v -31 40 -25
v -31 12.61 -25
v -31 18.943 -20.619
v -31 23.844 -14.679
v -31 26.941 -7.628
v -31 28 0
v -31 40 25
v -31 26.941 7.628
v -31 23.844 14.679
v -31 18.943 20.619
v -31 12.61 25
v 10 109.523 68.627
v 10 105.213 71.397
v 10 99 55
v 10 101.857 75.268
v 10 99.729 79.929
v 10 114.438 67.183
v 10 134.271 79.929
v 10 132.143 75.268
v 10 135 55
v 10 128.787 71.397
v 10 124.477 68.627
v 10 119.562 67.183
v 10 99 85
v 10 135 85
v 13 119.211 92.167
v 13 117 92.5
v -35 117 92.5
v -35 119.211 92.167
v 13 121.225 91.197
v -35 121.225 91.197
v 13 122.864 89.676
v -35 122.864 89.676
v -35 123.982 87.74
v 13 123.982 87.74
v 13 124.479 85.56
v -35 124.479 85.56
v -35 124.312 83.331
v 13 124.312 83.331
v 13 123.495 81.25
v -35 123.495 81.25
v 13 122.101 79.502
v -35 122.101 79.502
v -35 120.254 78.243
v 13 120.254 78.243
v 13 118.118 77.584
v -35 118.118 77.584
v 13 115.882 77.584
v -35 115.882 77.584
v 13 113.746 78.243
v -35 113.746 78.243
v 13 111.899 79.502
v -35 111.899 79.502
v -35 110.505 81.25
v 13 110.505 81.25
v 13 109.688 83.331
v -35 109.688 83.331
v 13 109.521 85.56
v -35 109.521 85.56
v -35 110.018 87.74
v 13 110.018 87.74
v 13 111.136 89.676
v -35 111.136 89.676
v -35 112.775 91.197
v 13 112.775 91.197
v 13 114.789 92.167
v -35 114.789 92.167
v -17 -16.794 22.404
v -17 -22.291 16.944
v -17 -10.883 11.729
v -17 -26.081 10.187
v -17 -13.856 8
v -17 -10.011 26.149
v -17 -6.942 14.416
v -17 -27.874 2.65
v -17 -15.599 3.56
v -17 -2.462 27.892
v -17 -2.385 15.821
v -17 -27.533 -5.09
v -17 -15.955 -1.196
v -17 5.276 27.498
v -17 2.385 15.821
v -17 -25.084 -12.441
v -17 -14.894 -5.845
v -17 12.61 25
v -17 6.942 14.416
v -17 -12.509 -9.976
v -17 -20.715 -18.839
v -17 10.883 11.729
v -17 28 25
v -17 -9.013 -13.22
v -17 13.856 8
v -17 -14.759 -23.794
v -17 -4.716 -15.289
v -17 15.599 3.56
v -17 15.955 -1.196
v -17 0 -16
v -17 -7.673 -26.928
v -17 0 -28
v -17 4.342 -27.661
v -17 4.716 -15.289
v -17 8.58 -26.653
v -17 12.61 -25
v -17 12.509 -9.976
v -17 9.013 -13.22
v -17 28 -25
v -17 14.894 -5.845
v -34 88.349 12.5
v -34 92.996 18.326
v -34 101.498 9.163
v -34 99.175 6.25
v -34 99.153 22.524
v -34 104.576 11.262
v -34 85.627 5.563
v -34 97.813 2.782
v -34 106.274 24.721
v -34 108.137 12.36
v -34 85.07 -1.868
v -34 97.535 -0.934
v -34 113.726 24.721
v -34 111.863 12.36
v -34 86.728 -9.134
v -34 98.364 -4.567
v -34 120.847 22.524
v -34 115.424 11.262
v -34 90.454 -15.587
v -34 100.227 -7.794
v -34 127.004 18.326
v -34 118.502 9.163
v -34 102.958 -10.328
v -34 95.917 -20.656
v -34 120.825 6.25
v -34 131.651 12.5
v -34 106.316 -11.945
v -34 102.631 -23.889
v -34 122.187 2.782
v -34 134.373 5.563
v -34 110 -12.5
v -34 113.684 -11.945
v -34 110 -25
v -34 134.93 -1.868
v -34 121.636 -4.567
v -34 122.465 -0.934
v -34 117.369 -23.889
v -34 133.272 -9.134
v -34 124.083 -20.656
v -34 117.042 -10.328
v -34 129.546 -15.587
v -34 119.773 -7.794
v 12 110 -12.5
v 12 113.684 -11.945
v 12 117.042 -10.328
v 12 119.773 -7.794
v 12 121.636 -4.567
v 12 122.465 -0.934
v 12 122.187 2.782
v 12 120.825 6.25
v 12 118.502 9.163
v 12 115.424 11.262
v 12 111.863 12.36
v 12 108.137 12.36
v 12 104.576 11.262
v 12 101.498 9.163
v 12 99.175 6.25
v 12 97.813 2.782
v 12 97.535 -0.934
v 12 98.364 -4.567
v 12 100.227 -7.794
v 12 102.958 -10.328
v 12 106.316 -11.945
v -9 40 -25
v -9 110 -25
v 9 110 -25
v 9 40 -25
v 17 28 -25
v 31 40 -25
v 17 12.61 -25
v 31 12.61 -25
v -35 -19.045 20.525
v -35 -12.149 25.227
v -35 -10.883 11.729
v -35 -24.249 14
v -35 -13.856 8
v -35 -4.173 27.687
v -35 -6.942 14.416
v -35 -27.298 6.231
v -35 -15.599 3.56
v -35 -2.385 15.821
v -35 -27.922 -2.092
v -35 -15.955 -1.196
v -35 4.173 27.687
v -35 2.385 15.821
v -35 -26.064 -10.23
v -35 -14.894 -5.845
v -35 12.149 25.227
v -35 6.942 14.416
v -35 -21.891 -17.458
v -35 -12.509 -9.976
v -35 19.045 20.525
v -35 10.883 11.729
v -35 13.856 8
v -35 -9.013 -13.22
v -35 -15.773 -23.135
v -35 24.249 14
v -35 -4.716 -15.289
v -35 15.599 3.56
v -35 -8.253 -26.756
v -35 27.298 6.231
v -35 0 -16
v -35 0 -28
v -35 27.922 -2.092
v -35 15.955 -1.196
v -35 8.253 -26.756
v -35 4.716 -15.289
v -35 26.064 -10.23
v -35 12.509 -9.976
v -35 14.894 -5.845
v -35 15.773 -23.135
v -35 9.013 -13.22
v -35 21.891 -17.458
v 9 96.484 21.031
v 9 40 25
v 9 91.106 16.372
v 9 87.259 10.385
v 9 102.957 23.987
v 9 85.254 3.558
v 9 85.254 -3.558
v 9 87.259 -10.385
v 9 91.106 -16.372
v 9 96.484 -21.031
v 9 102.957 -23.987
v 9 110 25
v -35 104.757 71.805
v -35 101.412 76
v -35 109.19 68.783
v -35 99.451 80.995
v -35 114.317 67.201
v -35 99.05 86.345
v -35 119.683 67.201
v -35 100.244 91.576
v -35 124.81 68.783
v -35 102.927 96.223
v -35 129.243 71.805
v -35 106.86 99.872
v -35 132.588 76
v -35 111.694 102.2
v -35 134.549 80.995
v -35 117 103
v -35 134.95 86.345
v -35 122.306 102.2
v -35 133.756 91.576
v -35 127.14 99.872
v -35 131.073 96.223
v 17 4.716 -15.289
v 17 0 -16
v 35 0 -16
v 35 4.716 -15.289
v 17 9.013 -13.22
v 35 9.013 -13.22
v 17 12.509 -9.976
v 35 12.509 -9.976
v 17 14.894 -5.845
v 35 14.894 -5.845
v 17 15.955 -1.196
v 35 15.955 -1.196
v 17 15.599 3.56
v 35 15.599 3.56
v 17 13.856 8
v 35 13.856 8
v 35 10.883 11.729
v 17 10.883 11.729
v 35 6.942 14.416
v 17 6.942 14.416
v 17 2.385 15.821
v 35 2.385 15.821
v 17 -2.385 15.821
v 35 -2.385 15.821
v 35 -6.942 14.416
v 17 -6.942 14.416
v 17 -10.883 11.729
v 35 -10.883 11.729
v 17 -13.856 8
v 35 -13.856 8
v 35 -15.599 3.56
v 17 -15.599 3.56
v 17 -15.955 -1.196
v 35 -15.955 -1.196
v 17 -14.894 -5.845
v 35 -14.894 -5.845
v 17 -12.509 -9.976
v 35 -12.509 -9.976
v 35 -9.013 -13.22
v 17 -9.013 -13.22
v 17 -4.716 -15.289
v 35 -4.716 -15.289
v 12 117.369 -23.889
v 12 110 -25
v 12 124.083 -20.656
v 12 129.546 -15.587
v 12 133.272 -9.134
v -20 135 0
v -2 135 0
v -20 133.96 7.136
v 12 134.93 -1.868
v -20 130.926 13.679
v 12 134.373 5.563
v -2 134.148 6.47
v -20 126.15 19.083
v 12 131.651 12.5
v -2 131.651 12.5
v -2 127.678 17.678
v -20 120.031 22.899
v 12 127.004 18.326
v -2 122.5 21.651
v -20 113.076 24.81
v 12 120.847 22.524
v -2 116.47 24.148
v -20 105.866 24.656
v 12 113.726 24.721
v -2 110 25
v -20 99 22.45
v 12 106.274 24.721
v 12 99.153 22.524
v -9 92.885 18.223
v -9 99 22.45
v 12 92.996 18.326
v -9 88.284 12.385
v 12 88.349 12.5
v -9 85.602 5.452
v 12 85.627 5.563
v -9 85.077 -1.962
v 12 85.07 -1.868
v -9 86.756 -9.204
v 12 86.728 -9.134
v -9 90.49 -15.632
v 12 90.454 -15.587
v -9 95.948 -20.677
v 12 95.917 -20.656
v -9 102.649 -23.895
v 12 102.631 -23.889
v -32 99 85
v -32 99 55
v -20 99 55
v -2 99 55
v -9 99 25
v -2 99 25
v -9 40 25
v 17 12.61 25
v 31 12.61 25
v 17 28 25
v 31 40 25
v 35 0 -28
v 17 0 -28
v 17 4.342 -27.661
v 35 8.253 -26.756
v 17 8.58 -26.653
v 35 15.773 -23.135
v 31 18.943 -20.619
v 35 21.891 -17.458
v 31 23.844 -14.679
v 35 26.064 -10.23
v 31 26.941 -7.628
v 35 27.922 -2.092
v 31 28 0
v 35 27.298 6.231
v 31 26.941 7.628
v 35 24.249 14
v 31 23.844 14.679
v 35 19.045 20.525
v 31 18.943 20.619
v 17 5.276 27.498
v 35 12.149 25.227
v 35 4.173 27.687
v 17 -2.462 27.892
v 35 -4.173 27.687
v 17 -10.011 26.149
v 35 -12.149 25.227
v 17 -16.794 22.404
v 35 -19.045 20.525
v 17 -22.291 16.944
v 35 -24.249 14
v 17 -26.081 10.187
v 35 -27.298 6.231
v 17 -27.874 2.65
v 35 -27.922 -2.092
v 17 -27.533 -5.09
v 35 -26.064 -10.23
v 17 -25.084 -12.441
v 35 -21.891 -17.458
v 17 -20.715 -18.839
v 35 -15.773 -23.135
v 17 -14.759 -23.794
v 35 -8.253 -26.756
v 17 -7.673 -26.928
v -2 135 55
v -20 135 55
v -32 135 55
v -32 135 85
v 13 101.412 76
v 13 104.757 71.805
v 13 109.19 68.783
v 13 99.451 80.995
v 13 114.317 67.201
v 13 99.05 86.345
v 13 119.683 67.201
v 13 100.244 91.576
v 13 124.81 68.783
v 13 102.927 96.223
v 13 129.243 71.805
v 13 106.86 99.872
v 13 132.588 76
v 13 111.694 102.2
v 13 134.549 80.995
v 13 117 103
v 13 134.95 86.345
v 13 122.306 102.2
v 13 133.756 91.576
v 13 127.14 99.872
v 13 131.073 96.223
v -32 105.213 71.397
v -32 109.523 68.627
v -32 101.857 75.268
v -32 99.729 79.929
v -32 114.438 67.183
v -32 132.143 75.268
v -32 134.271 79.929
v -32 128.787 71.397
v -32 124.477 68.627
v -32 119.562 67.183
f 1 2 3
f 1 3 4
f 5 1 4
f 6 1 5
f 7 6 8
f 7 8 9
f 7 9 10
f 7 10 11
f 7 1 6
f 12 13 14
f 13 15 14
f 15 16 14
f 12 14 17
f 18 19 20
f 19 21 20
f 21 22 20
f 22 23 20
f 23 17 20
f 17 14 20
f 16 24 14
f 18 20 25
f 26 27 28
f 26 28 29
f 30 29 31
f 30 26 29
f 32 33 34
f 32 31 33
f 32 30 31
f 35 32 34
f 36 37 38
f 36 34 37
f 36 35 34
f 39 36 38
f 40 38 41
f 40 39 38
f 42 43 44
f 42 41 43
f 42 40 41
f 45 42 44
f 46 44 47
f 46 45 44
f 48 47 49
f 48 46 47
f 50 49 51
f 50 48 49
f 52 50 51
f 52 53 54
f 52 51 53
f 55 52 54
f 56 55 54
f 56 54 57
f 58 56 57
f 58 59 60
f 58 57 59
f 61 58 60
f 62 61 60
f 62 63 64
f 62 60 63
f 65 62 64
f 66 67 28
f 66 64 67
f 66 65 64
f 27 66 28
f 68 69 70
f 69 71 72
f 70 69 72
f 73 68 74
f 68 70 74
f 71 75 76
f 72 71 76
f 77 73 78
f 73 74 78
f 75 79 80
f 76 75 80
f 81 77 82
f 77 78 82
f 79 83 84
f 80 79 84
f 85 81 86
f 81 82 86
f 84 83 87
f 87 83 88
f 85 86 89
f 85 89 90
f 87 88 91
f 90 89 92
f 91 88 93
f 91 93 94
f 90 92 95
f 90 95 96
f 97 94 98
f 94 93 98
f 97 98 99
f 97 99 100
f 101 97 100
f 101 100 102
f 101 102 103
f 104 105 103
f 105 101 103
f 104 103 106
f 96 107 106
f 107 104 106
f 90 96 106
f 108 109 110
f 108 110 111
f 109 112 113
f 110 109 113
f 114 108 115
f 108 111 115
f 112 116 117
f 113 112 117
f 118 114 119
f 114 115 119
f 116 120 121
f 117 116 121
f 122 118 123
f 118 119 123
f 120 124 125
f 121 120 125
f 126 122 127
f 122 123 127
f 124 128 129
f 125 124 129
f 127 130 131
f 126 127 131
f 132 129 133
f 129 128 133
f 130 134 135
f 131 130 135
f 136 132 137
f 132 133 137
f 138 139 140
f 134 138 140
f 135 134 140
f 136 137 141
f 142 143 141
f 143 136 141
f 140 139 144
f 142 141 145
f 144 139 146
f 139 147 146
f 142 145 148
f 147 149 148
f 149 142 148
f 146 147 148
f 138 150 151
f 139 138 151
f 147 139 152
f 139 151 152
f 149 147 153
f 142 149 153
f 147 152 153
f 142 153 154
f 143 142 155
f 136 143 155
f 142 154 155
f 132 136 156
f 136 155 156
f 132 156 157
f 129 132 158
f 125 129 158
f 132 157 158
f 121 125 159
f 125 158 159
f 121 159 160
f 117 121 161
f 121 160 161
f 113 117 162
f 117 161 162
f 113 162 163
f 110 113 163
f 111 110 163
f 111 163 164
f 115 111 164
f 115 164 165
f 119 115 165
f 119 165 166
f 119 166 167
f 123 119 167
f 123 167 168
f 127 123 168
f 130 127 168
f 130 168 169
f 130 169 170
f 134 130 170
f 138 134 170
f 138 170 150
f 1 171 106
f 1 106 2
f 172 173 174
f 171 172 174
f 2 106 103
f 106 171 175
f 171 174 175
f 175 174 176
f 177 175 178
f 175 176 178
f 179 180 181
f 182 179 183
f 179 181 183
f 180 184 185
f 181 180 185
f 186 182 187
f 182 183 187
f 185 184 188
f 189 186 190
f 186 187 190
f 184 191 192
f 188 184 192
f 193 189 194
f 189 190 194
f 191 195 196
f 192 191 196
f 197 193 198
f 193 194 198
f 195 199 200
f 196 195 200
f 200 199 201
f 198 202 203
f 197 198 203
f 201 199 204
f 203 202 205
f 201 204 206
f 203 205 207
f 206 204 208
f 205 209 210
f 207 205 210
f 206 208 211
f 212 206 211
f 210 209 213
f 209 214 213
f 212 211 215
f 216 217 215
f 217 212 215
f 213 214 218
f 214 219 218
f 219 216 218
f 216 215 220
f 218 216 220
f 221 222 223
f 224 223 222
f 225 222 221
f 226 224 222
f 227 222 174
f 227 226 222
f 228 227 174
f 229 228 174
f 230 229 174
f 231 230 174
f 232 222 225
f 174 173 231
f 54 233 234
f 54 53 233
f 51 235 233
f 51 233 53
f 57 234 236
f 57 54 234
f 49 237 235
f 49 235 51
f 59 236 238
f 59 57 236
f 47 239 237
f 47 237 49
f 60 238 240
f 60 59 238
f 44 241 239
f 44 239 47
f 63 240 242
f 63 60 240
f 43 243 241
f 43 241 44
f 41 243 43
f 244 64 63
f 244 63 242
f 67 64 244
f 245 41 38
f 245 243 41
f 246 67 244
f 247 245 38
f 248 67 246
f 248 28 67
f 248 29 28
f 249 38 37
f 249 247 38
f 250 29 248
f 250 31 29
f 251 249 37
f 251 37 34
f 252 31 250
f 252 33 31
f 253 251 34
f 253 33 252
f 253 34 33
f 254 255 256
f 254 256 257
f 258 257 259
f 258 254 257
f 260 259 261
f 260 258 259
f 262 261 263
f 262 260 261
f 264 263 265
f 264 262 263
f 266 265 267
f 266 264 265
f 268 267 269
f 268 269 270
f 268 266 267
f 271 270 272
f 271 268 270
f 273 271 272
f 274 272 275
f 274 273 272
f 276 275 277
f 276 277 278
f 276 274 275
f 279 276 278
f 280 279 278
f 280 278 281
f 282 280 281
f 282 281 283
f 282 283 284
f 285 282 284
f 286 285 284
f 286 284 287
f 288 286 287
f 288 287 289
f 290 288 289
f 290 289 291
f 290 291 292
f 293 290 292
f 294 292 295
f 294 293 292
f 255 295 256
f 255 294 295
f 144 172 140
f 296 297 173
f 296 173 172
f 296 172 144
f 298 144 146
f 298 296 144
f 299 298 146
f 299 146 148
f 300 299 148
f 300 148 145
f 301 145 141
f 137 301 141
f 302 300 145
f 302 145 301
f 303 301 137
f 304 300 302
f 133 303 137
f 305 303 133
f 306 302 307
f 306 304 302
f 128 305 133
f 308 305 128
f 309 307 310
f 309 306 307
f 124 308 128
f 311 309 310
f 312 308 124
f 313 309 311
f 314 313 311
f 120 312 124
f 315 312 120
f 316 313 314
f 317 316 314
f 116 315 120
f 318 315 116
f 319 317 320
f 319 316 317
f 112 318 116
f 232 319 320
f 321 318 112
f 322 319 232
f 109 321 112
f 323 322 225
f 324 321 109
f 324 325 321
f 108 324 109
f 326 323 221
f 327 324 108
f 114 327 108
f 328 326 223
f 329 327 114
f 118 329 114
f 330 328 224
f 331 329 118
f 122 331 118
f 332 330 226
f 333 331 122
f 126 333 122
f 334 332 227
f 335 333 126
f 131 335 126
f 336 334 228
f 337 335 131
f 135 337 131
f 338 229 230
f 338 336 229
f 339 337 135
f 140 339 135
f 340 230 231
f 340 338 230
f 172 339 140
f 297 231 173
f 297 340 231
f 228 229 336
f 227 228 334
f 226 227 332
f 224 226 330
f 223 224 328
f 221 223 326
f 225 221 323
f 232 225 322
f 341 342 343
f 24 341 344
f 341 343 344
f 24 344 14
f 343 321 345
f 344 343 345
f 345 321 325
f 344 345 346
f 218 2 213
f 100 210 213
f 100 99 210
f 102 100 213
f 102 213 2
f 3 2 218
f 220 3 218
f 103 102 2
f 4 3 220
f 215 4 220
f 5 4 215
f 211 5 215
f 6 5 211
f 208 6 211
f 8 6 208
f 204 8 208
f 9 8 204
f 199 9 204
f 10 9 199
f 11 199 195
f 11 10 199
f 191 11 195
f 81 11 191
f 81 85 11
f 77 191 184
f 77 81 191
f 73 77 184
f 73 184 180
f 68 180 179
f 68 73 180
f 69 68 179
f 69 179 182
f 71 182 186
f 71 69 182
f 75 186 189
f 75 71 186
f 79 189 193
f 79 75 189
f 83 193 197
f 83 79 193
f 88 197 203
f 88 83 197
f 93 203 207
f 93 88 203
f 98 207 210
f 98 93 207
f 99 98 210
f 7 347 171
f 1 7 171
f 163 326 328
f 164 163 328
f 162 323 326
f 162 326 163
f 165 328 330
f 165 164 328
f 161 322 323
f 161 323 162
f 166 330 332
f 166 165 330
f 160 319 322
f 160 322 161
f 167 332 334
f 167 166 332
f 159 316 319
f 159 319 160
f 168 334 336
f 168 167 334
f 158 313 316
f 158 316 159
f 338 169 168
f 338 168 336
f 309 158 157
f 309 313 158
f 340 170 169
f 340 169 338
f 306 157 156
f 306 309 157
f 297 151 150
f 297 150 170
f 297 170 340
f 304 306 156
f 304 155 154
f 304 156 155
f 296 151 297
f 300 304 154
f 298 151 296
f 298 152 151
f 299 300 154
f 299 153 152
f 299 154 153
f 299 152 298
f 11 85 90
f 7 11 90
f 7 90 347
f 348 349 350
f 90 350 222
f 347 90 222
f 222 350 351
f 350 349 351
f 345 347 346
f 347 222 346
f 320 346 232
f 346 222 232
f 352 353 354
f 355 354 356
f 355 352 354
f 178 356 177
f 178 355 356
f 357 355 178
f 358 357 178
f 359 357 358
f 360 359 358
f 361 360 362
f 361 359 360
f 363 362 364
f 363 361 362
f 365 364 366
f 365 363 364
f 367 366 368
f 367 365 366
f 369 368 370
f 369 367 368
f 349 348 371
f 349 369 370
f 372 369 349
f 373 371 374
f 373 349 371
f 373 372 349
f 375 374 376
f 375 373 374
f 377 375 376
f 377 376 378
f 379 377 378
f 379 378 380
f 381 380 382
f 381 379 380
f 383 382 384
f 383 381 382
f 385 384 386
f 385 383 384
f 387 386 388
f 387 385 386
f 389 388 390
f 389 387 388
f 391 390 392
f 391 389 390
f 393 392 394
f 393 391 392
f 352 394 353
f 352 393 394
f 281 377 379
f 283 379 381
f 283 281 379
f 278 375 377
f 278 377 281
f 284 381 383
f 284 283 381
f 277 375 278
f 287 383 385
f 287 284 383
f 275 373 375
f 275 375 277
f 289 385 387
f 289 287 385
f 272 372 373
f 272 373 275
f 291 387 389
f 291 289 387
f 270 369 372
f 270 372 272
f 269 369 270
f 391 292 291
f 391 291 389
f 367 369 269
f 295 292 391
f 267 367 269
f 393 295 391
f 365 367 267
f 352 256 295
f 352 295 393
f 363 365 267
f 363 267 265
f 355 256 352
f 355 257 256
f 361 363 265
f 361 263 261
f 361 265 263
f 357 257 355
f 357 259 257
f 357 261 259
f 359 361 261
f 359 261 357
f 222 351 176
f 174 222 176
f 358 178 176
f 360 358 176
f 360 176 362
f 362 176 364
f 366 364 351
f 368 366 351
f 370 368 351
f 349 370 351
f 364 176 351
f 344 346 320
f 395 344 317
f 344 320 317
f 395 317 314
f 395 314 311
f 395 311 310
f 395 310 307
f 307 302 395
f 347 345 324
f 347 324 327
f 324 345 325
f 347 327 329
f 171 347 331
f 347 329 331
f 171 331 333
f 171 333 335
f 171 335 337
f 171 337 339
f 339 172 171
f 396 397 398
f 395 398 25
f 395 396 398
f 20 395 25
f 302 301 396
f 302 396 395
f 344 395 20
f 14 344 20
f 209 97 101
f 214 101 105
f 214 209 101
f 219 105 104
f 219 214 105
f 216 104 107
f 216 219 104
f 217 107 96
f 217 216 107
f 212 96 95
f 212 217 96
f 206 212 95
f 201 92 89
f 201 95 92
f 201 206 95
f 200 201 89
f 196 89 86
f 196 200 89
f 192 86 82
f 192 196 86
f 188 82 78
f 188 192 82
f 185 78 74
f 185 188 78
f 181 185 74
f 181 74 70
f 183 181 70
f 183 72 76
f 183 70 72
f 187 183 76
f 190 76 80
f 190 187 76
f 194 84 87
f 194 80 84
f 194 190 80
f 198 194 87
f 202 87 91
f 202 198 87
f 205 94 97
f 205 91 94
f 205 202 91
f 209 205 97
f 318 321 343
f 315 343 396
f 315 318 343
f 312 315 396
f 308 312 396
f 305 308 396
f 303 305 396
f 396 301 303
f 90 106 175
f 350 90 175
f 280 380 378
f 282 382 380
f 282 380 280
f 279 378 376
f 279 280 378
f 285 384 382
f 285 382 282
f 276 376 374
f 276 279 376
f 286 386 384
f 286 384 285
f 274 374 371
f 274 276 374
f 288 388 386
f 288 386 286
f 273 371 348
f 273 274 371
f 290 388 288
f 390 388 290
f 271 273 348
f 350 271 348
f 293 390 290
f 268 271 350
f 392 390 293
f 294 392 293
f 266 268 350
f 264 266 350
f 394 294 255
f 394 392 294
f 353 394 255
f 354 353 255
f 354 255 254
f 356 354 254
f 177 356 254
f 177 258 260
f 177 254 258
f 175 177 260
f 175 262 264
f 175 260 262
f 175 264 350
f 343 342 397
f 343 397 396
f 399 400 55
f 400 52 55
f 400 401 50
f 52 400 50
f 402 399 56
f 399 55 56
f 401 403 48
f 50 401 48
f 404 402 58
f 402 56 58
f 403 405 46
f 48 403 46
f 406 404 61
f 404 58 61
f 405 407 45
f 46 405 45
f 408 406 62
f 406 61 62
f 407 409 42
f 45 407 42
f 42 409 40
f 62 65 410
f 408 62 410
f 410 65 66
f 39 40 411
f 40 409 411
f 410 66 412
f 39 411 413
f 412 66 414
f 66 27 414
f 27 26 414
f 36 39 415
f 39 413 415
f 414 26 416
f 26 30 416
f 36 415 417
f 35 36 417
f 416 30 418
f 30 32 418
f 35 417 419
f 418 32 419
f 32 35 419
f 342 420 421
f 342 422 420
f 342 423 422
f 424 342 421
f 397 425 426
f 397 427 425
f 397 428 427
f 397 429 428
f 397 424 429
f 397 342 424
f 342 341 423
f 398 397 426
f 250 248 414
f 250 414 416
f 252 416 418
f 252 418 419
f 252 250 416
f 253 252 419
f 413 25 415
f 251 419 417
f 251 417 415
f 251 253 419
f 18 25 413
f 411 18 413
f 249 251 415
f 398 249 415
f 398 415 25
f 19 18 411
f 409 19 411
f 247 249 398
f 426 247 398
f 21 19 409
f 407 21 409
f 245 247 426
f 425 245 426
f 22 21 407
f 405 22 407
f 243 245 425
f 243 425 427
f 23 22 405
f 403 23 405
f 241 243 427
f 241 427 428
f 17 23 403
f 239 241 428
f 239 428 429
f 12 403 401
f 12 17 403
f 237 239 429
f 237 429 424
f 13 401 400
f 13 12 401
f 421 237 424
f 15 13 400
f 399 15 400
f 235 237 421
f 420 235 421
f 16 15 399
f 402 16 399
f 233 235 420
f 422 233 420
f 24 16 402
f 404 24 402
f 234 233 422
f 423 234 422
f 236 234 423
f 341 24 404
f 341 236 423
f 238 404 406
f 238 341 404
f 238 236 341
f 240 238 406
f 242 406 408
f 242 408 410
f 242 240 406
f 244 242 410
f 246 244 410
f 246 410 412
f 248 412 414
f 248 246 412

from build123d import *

# Parameters (mm, degrees)
SKETCH1_R               = 28
SKETCH1_R_2             = 16
BOSS_EXTRUDE1_DEPTH     = 35
BOSS_EXTRUDE4_DEPTH     = 31
BOSS_EXTRUDE8_DEPTH     = 9
BOSS_EXTRUDE10_START    = 12
SKETCH6_8_R             = 12.5
BOSS_EXTRUDE10_DEPTH    = 12
SKETCH6_9_R             = 12.5
BOSS_EXTRUDE11_DEPTH    = 34
CUT_EXTRUDE2_DEPTH      = 143.246265329
CUT_EXTRUDE2_DEPTH_BACK = 143.246265329
SKETCH8_W               = 34
SKETCH8_H               = 56
SKETCH9_W               = 18
SKETCH9_H               = 36
BOSS_EXTRUDE12_DEPTH    = 55
CUT_EXTRUDE3_DEPTH      = 150.916643506
CUT_EXTRUDE3_DEPTH_BACK = 150.916643506
SKETCH12_R              = 12.5
SKETCH18_W              = 42
SKETCH18_H              = 36
BOSS_EXTRUDE15_DEPTH    = 30
CUT_EXTRUDE8_DEPTH      = 167.03011775
CUT_EXTRUDE8_DEPTH_BACK = 167.03011775
SKETCH30_R              = 7.5
SKETCH31_R              = 18
BOSS_EXTRUDE18_DEPTH    = 24
CUT_EXTRUDE9_DEPTH      = 176.926120858
CUT_EXTRUDE9_DEPTH_BACK = 176.926120858
SKETCH30_2_R            = 7.5


with BuildPart() as part:
    # Sketch1 → Boss-Extrude1 (new, symmetric)
    with BuildSketch(Plane(origin=(0, 0, 0), x_dir=(0, 0, -1), z_dir=(1, 0, 0))):
        Circle(SKETCH1_R)
        Circle(SKETCH1_R_2, mode=Mode.SUBTRACT)
    extrude(amount=BOSS_EXTRUDE1_DEPTH, both=True)

    # Sketch2 → Boss-Extrude4 (add, symmetric)
    with BuildSketch(Plane(origin=(0, 0, 0), x_dir=(0, 0, -1), z_dir=(1, 0, 0))):
        with BuildLine():
            Line((-25, 40), (25, 40))
            Line((25, 40), (25, 12.609520213))
            ThreePointArc((25, 12.609520213), (0, 28), (-25, 12.609520213))
            Line((-25, 12.609520213), (-25, 40))
        make_face()
    extrude(amount=BOSS_EXTRUDE4_DEPTH, both=True)

    # Sketch6 → Boss-Extrude8 (add, symmetric)
    with BuildSketch(Plane(origin=(0, 0, 0), x_dir=(0, 0, -1), z_dir=(1, 0, 0))):
        with BuildLine():
            Line((-25, 110), (-25, 40))
            Line((-25, 40), (25, 40))
            Line((25, 40), (25, 110))
            ThreePointArc((25, 110), (0, 85), (-25, 110))
        make_face()
    extrude(amount=BOSS_EXTRUDE8_DEPTH, both=True)

    # Sketch6<8> → Boss-Extrude10 (add)
    with BuildSketch(Plane(origin=(0, 0, 0), x_dir=(0, 0, -1), z_dir=(1, 0, 0)).offset(BOSS_EXTRUDE10_START)):
        with BuildLine():
            ThreePointArc((25, 110), (0, 135), (-25, 110))
            ThreePointArc((-25, 110), (0, 85), (25, 110))
        make_face()
        with Locations((0, 110)):
            Circle(SKETCH6_8_R, mode=Mode.SUBTRACT)
    extrude(amount=-BOSS_EXTRUDE10_DEPTH)

    # Sketch6<9> → Boss-Extrude11 (add)
    with BuildSketch(Plane(origin=(0, 0, 0), x_dir=(0, 0, -1), z_dir=(1, 0, 0))):
        with BuildLine():
            ThreePointArc((25, 110), (0, 135), (-25, 110))
            ThreePointArc((-25, 110), (0, 85), (25, 110))
        make_face()
        with Locations((0, 110)):
            Circle(SKETCH6_9_R, mode=Mode.SUBTRACT)
    extrude(amount=-BOSS_EXTRUDE11_DEPTH)

    # Sketch8 → Cut-Extrude2 (cut, two sides: drawn at the far end of the back side and taken through both)
    with BuildSketch(Plane.XY.offset(-CUT_EXTRUDE2_DEPTH_BACK)):
        Rectangle(SKETCH8_W, SKETCH8_H)
    extrude(amount=CUT_EXTRUDE2_DEPTH + CUT_EXTRUDE2_DEPTH_BACK, mode=Mode.SUBTRACT)

    # Sketch9 → Boss-Extrude12 (add)
    with BuildSketch(Plane.XY):
        with Locations((-11, 117)):
            Rectangle(SKETCH9_W, SKETCH9_H)
    extrude(amount=BOSS_EXTRUDE12_DEPTH)

    # Sketch12 → Cut-Extrude3 (cut, two sides: drawn at the far end of the back side and taken through both)
    with BuildSketch(Plane(origin=(0, 0, 0), x_dir=(0, 0, -1), z_dir=(1, 0, 0)).offset(-CUT_EXTRUDE3_DEPTH_BACK)):
        with Locations((0, 110)):
            Circle(SKETCH12_R)
    extrude(amount=CUT_EXTRUDE3_DEPTH + CUT_EXTRUDE3_DEPTH_BACK, mode=Mode.SUBTRACT)

    # Sketch18 → Boss-Extrude15 (add)
    with BuildSketch(Plane.XY.offset(55)):
        with Locations((-11, 117)):
            Rectangle(SKETCH18_W, SKETCH18_H)
    extrude(amount=BOSS_EXTRUDE15_DEPTH)

    # Sketch30 → Cut-Extrude8 (cut, two sides: drawn at the far end of the back side and taken through both)
    with BuildSketch(Plane.ZY.offset(11).offset(-CUT_EXTRUDE8_DEPTH_BACK)):
        with Locations((85, 117)):
            Circle(SKETCH30_R)
    extrude(amount=CUT_EXTRUDE8_DEPTH + CUT_EXTRUDE8_DEPTH_BACK, mode=Mode.SUBTRACT)

    # Sketch31 → Boss-Extrude18 (add, symmetric)
    with BuildSketch(Plane.ZY.offset(11)):
        with Locations((85, 117)):
            Circle(SKETCH31_R)
    extrude(amount=BOSS_EXTRUDE18_DEPTH, both=True)

    # Sketch30<2> → Cut-Extrude9 (cut, two sides: drawn at the far end of the back side and taken through both)
    with BuildSketch(Plane.ZY.offset(11).offset(-CUT_EXTRUDE9_DEPTH_BACK)):
        with Locations((85, 117)):
            Circle(SKETCH30_2_R)
    extrude(amount=CUT_EXTRUDE9_DEPTH + CUT_EXTRUDE9_DEPTH_BACK, mode=Mode.SUBTRACT)


solid = part.part
